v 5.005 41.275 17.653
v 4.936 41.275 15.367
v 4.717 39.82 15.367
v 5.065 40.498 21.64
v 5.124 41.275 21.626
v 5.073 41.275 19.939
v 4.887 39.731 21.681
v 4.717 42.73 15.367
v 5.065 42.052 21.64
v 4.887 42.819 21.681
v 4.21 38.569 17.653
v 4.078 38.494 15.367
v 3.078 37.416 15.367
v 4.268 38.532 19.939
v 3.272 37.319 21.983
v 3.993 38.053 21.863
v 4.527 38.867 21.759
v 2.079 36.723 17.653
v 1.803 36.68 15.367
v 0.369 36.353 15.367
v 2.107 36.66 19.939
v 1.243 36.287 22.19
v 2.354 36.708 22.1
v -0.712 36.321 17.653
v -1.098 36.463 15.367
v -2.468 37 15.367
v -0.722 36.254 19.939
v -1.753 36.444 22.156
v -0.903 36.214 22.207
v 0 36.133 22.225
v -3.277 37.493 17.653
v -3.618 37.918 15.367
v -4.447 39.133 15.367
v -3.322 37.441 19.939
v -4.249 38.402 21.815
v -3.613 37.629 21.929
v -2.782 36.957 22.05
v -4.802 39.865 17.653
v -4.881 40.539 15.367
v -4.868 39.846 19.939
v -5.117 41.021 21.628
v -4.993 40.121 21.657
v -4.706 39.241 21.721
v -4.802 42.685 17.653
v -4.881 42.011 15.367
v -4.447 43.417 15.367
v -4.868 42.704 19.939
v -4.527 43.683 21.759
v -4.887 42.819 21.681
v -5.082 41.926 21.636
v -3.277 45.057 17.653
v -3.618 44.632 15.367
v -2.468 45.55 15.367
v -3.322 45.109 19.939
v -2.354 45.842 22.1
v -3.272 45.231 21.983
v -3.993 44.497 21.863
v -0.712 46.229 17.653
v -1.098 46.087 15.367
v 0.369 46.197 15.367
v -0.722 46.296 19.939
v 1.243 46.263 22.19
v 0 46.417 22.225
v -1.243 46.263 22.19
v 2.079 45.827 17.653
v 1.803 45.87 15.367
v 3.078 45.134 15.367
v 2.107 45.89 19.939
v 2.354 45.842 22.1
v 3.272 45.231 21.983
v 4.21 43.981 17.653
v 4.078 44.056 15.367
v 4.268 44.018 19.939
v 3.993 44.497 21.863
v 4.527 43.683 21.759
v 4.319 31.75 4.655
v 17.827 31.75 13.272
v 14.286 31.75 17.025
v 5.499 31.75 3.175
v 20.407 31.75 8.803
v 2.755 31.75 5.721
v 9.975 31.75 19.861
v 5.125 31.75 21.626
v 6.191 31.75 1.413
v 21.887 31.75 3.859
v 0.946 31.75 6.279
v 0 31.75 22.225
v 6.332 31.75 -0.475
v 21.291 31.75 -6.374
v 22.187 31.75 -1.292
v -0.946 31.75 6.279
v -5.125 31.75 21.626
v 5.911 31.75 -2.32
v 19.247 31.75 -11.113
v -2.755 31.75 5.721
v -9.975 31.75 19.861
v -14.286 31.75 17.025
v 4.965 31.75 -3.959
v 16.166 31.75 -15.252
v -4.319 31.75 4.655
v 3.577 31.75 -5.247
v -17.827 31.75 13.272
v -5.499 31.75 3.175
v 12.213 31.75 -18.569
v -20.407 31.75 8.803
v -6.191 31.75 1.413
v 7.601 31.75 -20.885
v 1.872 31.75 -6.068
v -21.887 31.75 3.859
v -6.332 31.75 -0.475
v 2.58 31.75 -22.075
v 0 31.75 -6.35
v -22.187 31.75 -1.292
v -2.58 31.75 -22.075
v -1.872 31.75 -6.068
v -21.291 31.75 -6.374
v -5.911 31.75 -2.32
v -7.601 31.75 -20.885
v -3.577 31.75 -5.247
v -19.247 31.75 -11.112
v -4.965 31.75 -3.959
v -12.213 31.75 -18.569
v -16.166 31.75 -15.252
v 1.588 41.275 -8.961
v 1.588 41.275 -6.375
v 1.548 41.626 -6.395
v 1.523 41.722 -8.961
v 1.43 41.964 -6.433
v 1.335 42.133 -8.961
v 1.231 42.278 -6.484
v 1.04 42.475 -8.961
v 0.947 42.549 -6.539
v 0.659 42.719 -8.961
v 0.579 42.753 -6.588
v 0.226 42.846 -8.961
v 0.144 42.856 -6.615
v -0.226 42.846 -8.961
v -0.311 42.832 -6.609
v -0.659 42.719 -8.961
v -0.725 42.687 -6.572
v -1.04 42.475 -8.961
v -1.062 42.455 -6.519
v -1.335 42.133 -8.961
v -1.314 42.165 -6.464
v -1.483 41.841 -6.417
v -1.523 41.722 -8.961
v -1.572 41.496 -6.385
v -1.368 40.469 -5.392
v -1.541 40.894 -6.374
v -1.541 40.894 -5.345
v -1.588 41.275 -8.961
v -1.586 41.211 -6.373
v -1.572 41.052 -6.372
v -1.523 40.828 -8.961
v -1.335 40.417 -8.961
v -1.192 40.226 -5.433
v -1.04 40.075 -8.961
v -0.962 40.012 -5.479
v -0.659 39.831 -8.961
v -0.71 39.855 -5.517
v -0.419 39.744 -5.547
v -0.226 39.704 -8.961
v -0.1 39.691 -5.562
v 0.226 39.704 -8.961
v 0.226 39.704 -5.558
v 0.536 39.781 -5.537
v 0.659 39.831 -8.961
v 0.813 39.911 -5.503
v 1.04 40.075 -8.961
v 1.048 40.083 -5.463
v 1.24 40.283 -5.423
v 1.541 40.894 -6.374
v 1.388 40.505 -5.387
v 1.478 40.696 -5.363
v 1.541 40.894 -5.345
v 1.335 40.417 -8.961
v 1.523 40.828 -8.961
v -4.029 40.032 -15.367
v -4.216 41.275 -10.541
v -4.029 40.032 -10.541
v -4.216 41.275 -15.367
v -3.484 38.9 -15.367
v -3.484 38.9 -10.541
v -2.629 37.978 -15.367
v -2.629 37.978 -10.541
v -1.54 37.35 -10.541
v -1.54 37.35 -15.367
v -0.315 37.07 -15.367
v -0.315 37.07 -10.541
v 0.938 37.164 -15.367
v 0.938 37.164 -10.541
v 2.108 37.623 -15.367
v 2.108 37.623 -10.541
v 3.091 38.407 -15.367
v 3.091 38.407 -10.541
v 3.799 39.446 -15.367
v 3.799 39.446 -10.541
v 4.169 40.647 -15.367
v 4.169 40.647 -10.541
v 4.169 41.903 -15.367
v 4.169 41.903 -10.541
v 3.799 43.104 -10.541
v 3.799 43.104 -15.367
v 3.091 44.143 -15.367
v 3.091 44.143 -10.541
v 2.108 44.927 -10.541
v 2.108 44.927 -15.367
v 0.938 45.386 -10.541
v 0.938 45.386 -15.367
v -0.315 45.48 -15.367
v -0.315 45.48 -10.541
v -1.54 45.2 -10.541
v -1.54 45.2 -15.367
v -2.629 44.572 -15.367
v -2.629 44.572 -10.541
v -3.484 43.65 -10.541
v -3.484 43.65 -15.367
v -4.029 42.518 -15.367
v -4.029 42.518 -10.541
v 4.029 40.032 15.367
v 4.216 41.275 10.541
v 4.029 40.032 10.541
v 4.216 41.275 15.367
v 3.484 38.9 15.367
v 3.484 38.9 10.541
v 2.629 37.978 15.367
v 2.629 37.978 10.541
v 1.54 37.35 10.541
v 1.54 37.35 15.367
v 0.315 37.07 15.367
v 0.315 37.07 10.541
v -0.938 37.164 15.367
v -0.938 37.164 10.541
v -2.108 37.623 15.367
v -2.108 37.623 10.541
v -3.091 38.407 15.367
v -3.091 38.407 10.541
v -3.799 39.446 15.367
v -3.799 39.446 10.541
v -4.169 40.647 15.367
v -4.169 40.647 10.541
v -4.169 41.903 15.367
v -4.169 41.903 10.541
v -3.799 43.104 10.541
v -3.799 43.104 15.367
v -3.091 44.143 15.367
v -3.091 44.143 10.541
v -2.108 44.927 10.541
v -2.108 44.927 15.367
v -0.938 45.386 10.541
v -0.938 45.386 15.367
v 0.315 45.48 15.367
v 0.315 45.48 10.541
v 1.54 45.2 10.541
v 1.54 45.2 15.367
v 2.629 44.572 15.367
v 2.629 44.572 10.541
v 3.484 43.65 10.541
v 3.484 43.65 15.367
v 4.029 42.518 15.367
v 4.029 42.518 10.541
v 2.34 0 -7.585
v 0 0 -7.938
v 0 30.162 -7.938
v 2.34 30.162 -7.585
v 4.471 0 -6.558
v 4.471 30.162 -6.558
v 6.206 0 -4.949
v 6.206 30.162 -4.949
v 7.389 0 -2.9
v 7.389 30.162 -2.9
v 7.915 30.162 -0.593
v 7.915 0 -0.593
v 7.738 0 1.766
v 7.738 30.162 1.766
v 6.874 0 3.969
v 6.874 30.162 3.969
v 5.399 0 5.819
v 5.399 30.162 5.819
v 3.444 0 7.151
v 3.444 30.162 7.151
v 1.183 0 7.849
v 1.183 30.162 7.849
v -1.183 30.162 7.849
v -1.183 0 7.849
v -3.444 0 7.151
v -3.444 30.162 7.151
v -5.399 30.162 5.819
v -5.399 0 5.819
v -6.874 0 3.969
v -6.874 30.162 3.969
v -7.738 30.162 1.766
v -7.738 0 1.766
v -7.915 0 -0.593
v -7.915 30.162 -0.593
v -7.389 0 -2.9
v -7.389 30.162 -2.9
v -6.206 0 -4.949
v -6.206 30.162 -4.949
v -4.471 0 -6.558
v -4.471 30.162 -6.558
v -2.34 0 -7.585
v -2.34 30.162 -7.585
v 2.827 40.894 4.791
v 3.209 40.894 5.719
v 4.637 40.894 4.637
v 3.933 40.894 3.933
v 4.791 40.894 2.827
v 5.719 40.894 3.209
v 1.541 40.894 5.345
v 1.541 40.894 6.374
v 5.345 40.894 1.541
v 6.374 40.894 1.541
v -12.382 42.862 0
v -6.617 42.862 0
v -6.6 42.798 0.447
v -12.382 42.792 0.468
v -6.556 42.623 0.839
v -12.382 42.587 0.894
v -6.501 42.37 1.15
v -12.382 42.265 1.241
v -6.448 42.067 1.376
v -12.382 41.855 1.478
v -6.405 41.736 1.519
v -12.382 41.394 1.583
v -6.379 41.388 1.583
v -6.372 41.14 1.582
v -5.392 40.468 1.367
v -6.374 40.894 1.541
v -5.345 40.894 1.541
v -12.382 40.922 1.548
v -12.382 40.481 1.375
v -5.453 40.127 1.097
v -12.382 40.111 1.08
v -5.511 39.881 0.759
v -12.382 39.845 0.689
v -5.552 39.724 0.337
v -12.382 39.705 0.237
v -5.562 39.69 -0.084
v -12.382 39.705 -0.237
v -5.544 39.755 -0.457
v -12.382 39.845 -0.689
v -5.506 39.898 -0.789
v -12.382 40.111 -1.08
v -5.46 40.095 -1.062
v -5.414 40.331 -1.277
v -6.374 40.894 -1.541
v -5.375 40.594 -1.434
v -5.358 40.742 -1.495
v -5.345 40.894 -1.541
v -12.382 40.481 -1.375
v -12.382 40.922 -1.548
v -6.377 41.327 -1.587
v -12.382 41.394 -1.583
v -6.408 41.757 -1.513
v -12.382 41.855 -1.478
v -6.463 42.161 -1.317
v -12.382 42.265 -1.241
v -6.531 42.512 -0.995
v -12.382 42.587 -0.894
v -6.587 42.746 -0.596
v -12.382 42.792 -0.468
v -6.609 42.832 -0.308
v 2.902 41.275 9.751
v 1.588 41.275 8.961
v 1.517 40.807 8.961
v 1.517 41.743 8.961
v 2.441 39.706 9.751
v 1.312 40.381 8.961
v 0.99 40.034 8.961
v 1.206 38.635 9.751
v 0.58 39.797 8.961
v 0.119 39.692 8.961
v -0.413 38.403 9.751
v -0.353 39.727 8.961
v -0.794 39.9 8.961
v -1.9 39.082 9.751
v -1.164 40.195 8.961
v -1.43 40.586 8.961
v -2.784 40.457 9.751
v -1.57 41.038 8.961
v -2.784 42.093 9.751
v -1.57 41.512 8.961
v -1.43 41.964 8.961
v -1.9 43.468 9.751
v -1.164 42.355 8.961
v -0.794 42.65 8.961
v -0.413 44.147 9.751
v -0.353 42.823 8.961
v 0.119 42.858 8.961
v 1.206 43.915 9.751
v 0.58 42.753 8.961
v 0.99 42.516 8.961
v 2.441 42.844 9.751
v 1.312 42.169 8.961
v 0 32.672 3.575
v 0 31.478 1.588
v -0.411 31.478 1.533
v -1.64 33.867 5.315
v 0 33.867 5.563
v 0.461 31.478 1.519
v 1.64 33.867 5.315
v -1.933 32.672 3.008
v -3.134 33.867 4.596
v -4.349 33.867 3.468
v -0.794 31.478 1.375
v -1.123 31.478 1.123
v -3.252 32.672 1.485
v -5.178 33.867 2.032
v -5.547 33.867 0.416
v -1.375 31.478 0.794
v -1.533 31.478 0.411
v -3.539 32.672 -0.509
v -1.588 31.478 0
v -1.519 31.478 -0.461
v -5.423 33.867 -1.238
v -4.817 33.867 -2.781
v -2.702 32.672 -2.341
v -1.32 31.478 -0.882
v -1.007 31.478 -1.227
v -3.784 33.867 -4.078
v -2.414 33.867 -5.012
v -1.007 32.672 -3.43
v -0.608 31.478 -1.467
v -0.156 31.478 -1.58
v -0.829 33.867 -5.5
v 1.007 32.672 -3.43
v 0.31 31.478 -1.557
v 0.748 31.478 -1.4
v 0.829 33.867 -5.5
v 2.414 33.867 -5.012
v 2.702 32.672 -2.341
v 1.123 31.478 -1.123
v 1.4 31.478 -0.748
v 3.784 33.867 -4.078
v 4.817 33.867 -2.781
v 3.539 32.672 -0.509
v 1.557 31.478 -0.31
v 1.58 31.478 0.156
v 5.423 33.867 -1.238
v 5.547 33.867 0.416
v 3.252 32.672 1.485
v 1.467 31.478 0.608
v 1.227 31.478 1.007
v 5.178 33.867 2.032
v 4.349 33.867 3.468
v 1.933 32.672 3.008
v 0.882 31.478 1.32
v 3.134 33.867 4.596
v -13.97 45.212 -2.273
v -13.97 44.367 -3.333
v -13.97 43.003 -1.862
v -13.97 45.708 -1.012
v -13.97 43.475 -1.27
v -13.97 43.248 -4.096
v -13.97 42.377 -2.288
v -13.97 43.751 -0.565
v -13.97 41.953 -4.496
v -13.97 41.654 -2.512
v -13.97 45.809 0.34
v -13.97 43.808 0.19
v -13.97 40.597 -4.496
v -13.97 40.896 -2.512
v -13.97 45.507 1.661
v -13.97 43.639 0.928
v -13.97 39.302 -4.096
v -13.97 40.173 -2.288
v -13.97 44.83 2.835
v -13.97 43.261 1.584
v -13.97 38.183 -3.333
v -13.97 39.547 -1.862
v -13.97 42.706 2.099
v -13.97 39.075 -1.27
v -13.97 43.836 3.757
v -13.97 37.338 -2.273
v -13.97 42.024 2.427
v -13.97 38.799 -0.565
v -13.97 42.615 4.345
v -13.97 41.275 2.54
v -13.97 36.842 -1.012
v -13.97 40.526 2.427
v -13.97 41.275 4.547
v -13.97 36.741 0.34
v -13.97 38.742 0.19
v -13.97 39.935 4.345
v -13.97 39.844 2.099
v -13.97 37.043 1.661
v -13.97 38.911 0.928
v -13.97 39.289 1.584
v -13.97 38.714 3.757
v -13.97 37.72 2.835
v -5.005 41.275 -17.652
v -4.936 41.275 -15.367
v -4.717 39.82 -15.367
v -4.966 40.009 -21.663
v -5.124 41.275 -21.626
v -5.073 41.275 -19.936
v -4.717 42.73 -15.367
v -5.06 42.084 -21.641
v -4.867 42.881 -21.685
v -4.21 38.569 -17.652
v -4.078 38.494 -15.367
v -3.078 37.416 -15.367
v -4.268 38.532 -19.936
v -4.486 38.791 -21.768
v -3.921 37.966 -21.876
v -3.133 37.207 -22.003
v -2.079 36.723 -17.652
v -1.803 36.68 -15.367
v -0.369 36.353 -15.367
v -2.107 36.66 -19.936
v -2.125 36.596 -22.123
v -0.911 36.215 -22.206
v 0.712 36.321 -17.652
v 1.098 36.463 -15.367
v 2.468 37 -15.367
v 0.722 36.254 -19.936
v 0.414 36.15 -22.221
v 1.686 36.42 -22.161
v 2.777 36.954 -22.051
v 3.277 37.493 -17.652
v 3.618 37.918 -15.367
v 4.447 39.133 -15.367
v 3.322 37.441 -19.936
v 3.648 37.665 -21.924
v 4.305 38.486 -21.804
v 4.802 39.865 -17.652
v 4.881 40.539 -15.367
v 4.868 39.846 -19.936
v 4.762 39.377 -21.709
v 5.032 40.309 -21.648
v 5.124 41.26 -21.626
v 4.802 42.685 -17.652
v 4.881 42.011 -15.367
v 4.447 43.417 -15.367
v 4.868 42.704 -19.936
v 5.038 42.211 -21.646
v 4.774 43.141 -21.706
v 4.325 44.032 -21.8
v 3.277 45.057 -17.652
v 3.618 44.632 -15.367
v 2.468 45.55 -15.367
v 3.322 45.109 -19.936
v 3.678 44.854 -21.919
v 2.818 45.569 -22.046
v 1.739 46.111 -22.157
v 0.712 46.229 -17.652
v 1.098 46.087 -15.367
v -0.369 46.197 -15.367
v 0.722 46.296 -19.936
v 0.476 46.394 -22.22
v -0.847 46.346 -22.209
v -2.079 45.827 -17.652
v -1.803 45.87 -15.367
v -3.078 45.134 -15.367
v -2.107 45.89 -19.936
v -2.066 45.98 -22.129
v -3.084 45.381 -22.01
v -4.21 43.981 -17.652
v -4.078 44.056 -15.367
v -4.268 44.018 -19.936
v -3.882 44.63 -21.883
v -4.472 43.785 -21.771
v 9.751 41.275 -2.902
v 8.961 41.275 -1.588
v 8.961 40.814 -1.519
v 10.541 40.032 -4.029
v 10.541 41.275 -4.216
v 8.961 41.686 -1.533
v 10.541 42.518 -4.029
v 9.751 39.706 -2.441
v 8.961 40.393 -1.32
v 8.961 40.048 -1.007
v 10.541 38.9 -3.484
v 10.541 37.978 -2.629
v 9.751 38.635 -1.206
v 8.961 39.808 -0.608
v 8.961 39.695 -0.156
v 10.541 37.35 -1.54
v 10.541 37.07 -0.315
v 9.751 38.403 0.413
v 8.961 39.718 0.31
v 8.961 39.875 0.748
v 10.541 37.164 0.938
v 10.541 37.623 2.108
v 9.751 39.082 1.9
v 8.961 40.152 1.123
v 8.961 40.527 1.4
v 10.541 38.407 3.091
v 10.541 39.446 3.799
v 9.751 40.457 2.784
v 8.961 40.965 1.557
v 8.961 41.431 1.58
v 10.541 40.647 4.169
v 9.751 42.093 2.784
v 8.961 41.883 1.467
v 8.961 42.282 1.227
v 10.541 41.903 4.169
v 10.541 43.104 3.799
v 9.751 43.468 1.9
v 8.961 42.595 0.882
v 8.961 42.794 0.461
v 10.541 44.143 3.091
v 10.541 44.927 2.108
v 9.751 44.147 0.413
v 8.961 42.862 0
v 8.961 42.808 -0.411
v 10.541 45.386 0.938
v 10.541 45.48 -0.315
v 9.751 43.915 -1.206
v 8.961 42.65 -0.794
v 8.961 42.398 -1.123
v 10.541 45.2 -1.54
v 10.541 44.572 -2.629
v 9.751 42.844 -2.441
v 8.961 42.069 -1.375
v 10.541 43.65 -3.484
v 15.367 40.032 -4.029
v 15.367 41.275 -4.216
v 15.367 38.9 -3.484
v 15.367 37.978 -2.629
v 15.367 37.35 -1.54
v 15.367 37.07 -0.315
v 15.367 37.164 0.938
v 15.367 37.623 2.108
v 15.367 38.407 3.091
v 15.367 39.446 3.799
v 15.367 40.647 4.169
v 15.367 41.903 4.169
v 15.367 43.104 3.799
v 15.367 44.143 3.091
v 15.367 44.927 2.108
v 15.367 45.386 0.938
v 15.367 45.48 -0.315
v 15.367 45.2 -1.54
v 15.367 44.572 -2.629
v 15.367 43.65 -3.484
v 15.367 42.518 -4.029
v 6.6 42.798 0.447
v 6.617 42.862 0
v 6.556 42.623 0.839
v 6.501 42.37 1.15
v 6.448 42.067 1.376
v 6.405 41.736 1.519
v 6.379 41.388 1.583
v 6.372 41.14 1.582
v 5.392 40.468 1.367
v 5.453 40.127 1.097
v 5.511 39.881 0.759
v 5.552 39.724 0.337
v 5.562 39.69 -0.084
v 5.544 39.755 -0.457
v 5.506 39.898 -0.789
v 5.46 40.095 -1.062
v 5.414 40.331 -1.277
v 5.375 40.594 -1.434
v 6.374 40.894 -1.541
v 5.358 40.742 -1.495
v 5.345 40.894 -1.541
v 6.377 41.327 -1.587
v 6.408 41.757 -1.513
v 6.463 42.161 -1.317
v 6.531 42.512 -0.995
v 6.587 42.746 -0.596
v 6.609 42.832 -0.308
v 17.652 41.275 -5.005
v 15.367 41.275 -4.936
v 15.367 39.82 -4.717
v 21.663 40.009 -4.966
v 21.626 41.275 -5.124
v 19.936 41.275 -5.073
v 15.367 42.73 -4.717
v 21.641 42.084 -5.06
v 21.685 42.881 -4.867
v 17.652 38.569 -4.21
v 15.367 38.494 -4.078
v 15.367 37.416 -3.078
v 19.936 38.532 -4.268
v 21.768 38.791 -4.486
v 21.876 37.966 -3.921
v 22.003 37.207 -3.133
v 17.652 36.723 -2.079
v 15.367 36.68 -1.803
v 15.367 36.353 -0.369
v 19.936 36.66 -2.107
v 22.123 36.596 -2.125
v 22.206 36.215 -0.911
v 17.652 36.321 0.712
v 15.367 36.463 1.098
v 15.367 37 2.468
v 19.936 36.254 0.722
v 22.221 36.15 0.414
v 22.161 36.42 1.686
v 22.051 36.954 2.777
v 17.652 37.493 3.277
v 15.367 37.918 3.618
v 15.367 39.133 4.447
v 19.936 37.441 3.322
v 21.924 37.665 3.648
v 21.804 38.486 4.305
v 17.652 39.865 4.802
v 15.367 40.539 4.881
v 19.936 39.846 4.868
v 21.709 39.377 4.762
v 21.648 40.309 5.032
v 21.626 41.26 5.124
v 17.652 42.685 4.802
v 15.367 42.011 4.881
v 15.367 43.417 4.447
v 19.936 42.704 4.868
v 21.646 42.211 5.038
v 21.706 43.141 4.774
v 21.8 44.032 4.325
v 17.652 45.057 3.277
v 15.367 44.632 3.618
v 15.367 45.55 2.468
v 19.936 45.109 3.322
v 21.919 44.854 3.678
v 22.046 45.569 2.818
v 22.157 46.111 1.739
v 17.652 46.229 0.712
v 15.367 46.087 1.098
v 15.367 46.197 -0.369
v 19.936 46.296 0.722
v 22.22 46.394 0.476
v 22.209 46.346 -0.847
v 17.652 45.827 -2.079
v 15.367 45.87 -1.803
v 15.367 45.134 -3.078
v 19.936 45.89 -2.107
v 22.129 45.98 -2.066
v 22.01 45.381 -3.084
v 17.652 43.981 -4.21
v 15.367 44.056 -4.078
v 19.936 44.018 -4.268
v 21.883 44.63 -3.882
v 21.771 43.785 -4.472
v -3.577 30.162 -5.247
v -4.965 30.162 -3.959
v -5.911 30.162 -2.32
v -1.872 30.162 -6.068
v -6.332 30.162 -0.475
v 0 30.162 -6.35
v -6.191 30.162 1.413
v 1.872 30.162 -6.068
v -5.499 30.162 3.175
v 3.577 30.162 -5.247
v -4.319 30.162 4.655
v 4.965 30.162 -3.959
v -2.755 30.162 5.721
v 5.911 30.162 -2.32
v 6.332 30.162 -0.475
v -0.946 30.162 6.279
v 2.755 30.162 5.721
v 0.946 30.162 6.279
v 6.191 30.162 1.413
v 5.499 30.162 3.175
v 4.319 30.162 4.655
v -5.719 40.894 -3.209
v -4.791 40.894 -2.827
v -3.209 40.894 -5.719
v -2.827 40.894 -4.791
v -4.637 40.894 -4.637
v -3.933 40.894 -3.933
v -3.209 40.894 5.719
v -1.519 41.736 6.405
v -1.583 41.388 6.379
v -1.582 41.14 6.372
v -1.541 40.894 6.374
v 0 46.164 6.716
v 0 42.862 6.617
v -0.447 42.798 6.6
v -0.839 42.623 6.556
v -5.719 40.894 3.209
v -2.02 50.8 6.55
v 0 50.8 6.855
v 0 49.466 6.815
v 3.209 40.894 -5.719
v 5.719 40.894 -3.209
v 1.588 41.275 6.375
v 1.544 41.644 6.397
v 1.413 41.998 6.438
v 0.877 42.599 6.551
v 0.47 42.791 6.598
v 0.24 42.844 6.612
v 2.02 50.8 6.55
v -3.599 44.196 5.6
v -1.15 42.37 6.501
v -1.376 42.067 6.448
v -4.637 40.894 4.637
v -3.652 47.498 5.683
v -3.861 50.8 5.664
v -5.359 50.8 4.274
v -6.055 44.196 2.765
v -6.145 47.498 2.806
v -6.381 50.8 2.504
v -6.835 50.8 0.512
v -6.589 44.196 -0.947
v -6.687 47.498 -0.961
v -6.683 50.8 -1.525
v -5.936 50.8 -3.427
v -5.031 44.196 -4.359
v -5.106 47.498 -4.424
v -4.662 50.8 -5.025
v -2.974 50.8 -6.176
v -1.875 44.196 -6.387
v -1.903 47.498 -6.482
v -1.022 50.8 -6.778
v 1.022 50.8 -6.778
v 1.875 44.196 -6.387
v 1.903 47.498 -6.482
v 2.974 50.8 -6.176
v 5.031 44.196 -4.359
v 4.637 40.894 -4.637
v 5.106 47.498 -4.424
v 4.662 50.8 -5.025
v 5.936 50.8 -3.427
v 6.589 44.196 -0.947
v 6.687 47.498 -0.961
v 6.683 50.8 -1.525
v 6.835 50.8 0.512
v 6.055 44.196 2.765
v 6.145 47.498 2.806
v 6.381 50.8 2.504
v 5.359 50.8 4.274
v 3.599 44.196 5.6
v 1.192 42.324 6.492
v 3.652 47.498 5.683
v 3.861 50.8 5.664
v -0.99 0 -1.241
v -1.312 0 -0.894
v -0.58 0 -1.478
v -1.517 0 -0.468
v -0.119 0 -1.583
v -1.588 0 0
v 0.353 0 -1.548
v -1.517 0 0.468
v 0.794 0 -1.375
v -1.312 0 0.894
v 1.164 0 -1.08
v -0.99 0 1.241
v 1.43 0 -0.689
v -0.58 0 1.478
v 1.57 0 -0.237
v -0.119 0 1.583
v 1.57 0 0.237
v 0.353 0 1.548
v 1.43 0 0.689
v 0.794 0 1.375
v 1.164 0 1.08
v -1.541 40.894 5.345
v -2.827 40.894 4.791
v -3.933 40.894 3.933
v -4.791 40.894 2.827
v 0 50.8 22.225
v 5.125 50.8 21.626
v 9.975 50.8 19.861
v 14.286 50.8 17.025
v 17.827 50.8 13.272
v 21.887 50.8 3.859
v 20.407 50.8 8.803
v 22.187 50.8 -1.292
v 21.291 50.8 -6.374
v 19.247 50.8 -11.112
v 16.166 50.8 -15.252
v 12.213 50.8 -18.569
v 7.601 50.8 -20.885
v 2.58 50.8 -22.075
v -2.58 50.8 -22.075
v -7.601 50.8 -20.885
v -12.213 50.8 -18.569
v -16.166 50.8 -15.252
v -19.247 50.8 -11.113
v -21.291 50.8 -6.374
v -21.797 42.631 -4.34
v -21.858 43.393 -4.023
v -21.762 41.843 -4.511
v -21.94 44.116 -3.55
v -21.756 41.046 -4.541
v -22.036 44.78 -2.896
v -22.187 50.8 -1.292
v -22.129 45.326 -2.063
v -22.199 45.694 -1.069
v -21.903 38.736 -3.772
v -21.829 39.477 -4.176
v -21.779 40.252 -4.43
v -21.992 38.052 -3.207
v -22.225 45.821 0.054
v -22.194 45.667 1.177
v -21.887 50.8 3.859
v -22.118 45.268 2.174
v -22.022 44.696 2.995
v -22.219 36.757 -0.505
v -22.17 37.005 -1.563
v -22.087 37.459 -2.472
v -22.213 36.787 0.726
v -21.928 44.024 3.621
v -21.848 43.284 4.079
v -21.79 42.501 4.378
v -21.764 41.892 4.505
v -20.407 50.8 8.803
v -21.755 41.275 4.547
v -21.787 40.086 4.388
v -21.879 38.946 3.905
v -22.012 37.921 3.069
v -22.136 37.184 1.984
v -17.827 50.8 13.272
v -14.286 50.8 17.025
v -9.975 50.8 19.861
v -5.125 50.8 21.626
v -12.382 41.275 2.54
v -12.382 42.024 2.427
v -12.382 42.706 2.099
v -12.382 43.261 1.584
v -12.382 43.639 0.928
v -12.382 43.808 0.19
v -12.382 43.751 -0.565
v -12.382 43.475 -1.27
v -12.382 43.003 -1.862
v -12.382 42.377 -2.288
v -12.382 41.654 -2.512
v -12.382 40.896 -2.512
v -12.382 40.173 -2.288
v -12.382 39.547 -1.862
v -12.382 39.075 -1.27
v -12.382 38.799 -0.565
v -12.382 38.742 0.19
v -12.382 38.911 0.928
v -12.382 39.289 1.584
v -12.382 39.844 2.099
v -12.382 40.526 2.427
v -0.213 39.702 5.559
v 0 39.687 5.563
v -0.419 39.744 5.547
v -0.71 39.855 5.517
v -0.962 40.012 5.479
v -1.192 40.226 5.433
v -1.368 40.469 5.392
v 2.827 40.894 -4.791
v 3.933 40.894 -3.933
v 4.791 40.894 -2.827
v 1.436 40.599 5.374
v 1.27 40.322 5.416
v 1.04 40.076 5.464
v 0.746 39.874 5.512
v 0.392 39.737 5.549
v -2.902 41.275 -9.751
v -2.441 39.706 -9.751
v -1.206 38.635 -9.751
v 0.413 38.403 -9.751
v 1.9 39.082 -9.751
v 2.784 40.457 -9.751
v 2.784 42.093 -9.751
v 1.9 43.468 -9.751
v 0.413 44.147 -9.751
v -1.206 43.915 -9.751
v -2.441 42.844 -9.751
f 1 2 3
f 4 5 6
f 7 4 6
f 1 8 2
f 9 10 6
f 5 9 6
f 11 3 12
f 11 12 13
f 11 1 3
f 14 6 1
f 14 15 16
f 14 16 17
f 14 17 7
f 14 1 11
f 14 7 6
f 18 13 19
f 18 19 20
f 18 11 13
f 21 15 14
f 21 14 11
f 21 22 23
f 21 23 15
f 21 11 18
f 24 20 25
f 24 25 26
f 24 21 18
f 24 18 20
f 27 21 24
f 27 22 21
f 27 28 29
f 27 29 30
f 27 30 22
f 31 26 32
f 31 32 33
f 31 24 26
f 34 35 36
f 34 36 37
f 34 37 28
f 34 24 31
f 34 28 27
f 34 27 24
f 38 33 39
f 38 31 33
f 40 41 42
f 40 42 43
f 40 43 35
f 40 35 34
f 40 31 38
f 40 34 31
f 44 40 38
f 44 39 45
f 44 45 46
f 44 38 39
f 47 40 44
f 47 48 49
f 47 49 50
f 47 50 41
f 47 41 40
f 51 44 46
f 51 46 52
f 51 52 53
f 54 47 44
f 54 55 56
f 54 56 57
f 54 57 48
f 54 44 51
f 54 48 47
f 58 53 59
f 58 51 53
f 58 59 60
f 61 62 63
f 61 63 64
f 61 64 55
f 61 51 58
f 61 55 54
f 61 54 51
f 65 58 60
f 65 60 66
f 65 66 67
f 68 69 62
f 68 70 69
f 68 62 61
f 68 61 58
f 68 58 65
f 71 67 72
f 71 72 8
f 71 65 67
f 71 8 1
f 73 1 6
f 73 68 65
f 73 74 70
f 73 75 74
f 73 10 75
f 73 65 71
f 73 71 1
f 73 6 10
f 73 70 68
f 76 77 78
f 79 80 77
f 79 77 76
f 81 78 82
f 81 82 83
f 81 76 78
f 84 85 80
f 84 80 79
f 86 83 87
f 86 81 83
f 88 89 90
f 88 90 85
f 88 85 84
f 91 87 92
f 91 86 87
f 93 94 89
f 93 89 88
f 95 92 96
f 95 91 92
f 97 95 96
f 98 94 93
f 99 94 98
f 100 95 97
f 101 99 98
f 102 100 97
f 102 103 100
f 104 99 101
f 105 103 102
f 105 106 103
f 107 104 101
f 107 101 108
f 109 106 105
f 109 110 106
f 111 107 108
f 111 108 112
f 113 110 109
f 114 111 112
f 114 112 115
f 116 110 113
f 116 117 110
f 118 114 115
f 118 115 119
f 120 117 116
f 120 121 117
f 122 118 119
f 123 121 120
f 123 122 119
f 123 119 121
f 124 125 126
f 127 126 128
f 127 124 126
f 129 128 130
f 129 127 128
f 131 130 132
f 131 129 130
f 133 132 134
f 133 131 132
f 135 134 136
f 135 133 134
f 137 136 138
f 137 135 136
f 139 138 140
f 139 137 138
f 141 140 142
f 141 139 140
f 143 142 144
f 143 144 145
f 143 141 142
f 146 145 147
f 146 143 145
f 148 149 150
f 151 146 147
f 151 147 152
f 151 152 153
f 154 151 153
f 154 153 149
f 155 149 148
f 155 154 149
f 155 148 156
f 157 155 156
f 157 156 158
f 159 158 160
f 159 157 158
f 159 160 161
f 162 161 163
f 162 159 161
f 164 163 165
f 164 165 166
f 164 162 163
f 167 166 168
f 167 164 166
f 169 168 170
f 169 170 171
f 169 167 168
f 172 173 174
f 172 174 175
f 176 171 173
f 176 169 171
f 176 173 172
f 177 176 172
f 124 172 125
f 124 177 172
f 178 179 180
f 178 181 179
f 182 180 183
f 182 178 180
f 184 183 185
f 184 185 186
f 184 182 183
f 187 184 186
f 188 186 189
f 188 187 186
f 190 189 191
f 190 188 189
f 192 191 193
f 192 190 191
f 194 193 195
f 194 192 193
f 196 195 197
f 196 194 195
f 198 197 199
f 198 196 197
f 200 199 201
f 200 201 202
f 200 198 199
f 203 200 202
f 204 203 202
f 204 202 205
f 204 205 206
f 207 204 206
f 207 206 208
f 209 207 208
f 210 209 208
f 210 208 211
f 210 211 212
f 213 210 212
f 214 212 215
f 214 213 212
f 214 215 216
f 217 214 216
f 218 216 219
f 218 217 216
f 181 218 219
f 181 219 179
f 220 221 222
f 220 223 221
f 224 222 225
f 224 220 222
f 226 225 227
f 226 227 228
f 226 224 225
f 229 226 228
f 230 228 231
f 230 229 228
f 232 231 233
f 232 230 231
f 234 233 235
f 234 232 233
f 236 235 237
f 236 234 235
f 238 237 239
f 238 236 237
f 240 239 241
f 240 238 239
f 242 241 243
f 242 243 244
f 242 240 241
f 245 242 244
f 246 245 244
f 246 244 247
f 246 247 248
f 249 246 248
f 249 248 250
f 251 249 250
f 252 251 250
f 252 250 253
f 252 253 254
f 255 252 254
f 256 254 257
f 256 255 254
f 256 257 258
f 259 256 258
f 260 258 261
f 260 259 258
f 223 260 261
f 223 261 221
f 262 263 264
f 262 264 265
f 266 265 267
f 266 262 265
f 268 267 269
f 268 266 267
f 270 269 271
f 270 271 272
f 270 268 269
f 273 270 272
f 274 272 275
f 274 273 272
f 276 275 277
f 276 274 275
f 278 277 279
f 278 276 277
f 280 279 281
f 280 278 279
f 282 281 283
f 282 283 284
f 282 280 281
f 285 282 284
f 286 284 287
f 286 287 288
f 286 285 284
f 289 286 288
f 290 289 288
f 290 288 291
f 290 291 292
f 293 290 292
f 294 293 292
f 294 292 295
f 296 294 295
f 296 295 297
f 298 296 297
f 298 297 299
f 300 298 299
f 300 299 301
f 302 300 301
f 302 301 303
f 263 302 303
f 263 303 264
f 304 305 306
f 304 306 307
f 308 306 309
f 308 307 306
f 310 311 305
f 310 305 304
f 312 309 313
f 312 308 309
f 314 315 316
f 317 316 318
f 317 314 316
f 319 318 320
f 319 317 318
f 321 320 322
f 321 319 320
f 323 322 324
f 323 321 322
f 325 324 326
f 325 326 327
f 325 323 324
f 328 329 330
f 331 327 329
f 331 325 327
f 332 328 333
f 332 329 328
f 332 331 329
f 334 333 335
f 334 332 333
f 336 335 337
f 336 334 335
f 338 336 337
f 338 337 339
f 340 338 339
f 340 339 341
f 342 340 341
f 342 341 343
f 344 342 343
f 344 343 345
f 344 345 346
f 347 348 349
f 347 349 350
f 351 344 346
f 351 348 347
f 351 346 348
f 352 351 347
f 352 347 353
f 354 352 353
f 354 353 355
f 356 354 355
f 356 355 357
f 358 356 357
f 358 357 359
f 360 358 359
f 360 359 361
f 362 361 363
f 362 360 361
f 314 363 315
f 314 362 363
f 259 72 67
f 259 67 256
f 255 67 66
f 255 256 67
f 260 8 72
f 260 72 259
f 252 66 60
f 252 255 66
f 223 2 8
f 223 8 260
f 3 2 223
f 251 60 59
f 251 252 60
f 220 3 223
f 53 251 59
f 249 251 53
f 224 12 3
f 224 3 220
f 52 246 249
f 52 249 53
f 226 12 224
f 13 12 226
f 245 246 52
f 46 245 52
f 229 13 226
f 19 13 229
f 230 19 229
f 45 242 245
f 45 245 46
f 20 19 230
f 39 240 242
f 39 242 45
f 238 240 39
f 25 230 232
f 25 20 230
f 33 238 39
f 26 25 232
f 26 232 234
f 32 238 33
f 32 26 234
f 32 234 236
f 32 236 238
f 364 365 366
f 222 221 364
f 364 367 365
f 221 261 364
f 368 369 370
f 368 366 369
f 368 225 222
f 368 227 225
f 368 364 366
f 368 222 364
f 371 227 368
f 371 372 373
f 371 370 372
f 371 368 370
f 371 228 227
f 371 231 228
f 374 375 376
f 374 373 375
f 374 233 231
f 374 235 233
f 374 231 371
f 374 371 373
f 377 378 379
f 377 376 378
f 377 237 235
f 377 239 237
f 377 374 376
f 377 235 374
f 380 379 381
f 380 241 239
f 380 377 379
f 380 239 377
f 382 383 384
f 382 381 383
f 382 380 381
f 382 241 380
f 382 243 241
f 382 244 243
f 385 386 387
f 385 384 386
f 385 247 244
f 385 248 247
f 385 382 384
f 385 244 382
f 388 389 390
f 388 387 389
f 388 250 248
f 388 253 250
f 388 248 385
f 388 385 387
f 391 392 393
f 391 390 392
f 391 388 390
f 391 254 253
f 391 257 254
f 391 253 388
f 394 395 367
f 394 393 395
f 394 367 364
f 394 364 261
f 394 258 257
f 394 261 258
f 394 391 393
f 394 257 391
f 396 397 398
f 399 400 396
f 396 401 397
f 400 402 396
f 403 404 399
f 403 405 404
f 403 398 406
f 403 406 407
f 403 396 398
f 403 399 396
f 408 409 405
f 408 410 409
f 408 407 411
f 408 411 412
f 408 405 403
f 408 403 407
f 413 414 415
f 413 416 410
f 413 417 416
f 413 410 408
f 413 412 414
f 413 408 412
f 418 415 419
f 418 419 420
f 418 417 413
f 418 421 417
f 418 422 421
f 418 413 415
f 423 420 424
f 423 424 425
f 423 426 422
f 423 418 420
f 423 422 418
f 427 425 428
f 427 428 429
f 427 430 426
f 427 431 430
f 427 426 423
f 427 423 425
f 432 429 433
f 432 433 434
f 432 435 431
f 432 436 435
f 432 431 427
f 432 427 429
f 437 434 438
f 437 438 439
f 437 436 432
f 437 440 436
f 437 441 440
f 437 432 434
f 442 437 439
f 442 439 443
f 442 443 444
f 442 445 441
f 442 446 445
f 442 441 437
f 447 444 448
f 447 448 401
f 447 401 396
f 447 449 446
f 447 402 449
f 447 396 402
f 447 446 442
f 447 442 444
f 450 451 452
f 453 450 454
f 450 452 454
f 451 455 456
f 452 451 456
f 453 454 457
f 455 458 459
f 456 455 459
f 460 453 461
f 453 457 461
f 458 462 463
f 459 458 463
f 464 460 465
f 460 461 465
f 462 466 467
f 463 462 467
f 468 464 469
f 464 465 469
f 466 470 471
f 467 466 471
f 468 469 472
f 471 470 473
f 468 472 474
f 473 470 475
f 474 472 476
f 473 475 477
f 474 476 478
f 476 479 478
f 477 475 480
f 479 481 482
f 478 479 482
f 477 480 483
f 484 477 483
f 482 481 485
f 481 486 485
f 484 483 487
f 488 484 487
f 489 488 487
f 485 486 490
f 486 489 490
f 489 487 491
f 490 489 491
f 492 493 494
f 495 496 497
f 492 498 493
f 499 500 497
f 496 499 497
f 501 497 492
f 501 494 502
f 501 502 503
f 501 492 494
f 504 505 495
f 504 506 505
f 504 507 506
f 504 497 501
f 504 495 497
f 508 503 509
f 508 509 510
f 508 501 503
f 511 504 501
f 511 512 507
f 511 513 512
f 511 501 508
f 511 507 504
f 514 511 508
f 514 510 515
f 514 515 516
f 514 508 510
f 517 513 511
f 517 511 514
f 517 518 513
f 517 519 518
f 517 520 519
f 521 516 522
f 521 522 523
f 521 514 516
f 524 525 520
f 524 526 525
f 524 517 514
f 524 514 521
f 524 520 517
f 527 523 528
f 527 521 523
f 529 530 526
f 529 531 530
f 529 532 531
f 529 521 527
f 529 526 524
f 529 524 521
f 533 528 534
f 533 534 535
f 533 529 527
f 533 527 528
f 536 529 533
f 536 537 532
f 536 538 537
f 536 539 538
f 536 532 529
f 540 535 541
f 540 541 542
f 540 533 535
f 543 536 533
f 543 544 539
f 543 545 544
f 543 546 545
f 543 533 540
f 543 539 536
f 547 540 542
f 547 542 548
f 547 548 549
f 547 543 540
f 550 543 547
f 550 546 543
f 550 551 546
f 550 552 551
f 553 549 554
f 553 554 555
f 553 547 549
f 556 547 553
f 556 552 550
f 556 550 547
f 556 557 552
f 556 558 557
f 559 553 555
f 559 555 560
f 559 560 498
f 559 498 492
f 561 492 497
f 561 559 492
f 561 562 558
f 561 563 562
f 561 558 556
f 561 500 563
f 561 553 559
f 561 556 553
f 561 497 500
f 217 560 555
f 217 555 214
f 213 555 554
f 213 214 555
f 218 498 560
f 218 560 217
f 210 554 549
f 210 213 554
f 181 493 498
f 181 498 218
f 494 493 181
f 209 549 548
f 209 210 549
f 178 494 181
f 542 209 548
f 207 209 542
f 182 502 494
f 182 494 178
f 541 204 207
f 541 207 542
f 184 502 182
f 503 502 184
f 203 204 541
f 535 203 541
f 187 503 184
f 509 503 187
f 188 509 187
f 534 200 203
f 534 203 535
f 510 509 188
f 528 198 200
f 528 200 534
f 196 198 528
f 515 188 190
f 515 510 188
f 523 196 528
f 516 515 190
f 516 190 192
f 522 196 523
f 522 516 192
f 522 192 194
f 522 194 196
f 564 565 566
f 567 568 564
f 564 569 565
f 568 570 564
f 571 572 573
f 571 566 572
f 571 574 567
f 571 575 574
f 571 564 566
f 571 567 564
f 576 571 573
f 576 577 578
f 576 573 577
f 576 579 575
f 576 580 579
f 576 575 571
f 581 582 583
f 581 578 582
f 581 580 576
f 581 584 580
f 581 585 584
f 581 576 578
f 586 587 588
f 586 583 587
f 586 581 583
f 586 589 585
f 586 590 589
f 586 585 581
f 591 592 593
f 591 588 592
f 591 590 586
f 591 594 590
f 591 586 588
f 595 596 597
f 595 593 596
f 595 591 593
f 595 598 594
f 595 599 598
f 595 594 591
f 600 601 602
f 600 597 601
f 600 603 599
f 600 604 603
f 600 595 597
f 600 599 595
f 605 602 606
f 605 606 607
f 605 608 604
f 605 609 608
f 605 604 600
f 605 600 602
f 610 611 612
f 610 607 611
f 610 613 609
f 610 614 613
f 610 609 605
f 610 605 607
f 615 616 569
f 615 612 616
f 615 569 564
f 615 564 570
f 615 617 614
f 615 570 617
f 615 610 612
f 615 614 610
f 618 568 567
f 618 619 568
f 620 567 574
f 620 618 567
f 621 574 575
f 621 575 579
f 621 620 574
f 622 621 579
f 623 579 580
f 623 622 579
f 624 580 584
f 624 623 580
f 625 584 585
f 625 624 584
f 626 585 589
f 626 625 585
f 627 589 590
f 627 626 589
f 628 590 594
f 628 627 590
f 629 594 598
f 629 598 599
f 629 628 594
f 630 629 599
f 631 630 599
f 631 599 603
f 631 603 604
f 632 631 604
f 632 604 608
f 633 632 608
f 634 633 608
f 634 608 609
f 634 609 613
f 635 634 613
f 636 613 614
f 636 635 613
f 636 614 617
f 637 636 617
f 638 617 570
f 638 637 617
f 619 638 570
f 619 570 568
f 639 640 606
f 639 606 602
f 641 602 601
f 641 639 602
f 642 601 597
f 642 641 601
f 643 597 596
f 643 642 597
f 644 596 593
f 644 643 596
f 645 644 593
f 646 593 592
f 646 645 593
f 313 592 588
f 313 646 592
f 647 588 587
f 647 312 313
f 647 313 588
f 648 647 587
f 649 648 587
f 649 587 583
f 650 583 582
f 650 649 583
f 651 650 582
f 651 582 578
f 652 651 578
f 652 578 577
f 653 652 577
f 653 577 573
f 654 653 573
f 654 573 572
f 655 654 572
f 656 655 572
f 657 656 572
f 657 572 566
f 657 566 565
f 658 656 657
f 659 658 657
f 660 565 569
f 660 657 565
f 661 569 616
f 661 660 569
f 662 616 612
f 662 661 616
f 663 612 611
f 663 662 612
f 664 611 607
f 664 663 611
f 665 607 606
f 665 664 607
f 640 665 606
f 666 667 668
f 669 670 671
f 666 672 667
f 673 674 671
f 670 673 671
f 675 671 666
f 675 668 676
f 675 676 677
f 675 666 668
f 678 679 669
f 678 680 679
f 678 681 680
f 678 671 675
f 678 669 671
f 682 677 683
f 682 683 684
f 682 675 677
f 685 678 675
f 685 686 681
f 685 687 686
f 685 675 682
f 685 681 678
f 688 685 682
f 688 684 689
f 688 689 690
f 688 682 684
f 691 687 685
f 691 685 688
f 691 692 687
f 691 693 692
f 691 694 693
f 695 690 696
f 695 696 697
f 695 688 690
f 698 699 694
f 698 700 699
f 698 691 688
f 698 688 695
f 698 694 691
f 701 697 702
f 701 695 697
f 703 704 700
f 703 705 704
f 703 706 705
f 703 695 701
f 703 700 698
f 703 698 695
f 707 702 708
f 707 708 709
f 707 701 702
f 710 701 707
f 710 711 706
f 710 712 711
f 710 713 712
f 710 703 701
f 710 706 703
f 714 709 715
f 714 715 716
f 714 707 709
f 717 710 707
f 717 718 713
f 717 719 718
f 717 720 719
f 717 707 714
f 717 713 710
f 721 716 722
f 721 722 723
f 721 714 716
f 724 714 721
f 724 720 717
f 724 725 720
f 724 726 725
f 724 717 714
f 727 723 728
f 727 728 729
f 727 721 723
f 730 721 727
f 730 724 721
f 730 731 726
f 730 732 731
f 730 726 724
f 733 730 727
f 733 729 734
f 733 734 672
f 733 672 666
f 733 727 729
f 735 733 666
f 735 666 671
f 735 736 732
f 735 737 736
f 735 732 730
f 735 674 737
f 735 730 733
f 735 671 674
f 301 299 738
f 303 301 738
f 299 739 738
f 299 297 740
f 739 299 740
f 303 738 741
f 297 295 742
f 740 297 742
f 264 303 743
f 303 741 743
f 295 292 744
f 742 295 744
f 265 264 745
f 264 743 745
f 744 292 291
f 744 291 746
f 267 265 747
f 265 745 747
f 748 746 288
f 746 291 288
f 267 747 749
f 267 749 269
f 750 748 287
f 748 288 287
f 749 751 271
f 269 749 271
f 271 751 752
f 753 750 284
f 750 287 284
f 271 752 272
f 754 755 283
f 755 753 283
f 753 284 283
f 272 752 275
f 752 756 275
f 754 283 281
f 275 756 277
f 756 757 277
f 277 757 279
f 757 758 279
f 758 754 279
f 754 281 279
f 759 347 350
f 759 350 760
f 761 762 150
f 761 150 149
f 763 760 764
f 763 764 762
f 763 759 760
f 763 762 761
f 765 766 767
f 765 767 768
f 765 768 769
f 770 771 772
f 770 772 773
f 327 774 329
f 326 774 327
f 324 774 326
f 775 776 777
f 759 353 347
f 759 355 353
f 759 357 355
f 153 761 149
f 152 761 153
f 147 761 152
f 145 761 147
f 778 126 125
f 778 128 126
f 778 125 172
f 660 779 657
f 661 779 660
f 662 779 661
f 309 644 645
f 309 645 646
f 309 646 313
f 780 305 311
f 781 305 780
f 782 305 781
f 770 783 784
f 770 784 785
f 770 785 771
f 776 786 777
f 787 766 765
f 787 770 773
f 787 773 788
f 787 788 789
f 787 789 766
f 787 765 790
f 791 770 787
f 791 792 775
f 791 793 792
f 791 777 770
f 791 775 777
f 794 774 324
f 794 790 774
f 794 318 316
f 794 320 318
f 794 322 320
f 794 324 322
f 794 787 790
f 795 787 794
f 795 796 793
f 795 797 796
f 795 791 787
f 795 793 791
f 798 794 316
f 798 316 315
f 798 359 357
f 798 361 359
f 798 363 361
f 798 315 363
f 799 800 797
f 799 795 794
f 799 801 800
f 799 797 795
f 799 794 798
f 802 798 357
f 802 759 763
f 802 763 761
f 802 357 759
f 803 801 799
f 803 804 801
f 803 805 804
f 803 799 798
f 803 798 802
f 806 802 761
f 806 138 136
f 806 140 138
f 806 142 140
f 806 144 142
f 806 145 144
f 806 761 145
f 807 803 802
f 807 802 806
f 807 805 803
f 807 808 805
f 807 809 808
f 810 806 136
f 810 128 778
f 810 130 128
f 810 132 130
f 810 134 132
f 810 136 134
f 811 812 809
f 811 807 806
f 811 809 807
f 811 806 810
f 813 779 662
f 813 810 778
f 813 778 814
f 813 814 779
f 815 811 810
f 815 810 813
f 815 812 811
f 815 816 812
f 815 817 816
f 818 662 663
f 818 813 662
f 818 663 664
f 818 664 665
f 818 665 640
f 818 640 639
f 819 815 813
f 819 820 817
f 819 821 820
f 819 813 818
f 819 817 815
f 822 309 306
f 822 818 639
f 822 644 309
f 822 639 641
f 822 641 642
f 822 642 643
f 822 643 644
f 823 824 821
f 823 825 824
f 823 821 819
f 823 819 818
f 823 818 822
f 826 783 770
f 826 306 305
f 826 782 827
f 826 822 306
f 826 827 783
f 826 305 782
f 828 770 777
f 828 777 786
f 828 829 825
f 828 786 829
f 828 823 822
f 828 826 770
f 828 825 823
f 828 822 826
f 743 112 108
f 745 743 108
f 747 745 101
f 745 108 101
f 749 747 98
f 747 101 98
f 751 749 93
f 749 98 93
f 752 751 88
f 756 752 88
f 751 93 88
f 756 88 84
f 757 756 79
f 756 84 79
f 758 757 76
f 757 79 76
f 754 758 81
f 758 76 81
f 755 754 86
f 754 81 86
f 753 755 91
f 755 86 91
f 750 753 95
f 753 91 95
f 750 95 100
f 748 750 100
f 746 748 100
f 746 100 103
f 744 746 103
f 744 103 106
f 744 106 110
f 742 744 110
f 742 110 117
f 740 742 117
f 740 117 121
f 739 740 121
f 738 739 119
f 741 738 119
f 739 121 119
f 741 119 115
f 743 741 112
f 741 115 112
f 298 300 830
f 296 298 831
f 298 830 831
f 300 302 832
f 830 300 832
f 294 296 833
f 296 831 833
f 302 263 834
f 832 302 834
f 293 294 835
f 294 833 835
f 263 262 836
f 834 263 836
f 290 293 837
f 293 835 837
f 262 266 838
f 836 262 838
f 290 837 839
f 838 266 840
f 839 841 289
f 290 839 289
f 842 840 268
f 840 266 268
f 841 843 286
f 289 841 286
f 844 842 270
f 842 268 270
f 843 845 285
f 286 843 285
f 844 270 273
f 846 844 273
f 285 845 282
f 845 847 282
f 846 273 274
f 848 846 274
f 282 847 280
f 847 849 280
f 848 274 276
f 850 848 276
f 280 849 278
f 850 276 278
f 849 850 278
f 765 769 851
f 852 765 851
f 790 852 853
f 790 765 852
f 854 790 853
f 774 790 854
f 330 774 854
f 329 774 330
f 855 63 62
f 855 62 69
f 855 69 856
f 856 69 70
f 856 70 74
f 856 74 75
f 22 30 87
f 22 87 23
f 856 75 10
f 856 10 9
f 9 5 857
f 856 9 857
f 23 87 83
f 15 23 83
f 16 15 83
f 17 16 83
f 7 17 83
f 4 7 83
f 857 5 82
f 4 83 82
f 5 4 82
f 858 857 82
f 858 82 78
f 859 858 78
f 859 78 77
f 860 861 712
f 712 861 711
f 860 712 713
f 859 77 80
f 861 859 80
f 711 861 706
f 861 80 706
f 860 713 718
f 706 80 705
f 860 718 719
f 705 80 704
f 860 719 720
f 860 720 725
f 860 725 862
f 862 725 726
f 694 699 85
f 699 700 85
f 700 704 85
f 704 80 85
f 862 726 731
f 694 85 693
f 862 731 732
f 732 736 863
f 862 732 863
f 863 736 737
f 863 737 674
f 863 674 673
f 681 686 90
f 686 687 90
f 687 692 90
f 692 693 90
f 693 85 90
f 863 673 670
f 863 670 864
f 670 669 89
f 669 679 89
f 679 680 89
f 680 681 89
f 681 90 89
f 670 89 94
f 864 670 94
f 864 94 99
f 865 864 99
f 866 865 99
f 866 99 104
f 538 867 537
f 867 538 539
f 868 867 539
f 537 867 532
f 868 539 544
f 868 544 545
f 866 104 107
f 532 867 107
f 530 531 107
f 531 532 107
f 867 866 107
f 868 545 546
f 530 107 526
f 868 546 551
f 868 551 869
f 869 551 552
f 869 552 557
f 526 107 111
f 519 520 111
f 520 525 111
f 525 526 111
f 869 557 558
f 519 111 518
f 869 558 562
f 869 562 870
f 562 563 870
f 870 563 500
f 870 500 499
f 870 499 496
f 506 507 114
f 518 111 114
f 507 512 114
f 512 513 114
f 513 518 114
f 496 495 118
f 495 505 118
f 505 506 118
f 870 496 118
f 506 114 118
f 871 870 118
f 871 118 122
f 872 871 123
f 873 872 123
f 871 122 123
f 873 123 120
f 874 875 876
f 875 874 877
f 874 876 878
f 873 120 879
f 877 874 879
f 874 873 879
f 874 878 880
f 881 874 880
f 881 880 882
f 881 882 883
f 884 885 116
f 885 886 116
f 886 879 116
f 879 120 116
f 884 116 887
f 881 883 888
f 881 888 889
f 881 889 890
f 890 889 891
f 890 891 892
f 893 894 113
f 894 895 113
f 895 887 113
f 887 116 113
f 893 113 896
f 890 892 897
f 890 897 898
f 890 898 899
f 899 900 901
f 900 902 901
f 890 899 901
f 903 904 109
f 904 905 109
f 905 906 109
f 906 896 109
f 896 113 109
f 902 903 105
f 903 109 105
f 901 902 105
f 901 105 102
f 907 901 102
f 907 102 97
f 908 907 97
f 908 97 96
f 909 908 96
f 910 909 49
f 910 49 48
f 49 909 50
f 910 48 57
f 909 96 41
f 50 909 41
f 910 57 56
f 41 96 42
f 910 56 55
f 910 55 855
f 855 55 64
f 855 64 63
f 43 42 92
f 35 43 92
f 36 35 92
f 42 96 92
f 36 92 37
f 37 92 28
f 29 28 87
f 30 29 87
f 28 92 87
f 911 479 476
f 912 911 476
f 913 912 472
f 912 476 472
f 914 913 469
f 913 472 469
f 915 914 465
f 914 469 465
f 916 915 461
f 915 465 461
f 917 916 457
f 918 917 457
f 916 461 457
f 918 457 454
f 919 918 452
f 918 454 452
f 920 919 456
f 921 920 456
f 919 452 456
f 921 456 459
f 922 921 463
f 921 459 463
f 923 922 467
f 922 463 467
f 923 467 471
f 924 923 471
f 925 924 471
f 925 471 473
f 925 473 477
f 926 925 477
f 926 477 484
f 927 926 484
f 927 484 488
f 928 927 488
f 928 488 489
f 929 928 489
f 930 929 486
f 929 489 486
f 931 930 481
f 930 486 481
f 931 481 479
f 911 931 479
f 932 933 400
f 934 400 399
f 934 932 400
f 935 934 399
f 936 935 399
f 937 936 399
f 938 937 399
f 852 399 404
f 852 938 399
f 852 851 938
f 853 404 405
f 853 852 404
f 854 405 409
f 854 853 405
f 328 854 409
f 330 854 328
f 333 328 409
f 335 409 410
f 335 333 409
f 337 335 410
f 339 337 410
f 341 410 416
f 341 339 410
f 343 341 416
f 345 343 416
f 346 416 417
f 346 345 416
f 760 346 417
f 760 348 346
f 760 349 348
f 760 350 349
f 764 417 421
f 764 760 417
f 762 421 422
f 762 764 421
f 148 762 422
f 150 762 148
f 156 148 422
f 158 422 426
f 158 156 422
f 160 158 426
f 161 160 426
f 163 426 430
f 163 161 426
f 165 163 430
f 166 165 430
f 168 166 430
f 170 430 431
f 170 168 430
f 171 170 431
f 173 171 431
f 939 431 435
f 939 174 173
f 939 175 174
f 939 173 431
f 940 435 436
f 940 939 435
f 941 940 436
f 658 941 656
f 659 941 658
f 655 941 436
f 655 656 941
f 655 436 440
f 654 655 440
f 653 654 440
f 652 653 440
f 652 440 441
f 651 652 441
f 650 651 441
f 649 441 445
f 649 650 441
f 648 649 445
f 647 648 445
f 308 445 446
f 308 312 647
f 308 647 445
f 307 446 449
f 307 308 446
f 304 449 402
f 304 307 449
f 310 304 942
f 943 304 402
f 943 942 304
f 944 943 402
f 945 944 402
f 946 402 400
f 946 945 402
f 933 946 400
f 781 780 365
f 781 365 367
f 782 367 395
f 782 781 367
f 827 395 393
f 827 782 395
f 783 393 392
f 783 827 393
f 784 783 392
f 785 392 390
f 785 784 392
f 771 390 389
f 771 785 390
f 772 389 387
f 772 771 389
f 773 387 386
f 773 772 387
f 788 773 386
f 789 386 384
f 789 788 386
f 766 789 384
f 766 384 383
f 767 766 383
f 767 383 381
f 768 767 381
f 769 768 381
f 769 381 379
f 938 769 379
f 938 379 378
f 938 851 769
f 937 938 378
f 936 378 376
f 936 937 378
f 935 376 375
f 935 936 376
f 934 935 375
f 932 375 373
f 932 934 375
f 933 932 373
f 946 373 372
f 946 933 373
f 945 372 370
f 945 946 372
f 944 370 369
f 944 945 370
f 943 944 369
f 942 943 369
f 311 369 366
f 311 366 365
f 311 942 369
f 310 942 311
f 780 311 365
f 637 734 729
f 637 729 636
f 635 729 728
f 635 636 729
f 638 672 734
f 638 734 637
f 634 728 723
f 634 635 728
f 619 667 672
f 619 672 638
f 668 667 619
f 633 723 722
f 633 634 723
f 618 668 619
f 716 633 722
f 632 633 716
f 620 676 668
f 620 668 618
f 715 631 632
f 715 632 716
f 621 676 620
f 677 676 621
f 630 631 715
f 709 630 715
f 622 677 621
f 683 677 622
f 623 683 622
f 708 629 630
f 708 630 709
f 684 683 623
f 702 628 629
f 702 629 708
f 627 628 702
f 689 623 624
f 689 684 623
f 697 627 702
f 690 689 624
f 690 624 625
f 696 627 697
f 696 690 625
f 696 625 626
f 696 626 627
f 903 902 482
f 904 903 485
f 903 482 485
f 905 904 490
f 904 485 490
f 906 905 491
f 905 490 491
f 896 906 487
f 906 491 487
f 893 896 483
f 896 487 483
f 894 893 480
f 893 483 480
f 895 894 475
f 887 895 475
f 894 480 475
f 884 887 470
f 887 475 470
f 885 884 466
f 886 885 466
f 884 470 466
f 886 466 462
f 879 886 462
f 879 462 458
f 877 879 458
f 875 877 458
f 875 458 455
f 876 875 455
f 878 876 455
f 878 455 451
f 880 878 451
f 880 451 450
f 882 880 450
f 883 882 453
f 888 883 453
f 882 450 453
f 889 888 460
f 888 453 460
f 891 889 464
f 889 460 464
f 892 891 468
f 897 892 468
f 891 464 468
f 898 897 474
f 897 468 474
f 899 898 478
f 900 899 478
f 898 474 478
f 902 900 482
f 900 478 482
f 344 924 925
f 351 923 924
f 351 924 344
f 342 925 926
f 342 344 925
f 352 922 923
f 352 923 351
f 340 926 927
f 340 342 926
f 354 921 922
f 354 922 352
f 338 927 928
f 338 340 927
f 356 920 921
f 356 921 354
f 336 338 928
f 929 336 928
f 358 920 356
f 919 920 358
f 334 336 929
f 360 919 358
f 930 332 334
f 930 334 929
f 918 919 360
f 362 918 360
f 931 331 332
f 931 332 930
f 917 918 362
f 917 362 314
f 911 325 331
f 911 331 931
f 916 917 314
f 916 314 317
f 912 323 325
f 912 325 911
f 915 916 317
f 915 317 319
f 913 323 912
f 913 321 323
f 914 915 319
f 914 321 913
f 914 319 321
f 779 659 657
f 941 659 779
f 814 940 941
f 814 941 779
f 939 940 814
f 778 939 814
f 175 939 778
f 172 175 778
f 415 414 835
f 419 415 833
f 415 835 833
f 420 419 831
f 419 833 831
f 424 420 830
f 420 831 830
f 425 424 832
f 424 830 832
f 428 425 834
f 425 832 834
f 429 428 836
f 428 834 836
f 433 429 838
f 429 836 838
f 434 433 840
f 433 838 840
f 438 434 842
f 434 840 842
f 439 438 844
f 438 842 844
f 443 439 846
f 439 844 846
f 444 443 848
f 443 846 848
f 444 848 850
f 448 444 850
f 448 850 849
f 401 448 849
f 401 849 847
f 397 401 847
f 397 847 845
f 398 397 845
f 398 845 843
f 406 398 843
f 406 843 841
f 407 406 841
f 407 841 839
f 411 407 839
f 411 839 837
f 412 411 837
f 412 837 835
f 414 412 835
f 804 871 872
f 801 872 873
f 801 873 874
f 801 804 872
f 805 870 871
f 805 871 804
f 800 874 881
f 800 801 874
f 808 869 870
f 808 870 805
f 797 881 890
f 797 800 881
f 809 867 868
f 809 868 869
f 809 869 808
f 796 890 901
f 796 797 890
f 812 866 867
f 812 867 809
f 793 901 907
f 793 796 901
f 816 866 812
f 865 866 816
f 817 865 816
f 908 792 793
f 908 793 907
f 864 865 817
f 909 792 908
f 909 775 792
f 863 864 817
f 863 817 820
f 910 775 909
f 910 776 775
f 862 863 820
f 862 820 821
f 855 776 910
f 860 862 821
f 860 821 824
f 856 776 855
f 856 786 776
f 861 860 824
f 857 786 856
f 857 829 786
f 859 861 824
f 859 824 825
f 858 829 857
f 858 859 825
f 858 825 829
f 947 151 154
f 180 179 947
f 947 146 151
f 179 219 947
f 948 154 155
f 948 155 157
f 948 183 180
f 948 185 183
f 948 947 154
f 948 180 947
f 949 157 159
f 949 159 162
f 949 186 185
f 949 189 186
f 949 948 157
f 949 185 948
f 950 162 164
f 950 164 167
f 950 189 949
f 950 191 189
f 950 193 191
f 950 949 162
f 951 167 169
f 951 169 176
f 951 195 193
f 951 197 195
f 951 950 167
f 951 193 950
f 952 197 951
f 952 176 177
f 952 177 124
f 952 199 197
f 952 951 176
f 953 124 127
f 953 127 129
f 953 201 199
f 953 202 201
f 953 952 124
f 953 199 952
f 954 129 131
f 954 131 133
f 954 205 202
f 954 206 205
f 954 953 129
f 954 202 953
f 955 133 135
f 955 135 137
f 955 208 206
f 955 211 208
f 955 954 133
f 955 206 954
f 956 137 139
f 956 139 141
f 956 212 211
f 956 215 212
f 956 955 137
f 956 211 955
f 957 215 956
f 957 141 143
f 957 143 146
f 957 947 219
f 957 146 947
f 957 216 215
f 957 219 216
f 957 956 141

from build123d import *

# Parameters (mm, degrees)
SKETCH1_R                              = 22.225
BOSS_EXTRUDE1_DEPTH                    = 50.8
SKETCH2_OUTSIDE_W                      = 62.614
SKETCH2_OUTSIDE_H                      = 62.614
SKETCH2_OUTSIDE_R                      = 7.9375
CUT_EXTRUDE1_DEPTH                     = 31.75
F_1_8_0_125_DIAMETER_HOLE1_D           = 3.175
F_1_8_START                            = -22.225000076
F_1_8_0_125_DIAMETER_HOLE2_OUTLINE_R   = 1.5875
F_1_8_0_125_DIAMETER_HOLE2_DEPTH       = 31.186397695
F_1_8_START_2                          = -8.961397619
F_1_8_0_125_DIAMETER_HOLE2_2_OUTLINE_R = 1.5875
F_1_8_0_125_DIAMETER_HOLE2_2_DEPTH     = 17.922795238
F_1_8_27_NPSM_TAPPED_HOLE1_D           = 9.0932
F_1_8_27_NPSM_TAPPED_HOLE1_DEPTH       = 6.35
F_1_8_27_NPSM_TAPPED_HOLE1_TIP         = 2.73187289
CUT_EXTRUDE2_START                     = -13.97
SKETCH11_R                             = 4.5466
CUT_EXTRUDE2_DEPTH                     = 6.35
SKETCH12_R                             = 2.54
CUT_EXTRUDE3_DEPTH                     = 1.5875
CUT_EXTRUDE5_START                     = -31.75
SKETCH13_OUTSIDE_W                     = 62.614
SKETCH13_OUTSIDE_H                     = 62.614
SKETCH13_OUTSIDE_R                     = 6.35
CUT_EXTRUDE5_DEPTH                     = 1.5875


# Read off the part's stored shape, not the designer's step: 1/8 (0.125) Diameter Hole2
with BuildPart() as part:
    # Sketch1 → Boss-Extrude1 (new body)
    with BuildSketch(Plane(origin=(0, 0, 0), x_dir=(1, 0, 0), z_dir=(0, 1, 0))):
        with Locations(Location((0, 0, 0), (0, 0, 270))):
            Circle(SKETCH1_R)
    extrude(amount=BOSS_EXTRUDE1_DEPTH)

    # Sketch2 outside → Cut-Extrude1 (cut)
    with BuildSketch(Plane(origin=(0, 0, 0), x_dir=(-1, 0, 0), z_dir=(0, -1, 0))):
        Rectangle(SKETCH2_OUTSIDE_W, SKETCH2_OUTSIDE_H)
        with Locations(Location((0, 0, 0), (0, 0, 90))):
            Circle(SKETCH2_OUTSIDE_R, mode=Mode.SUBTRACT)
    extrude(amount=-CUT_EXTRUDE1_DEPTH, mode=Mode.SUBTRACT)

    # 1/8 (0.125) Diameter Hole1 (through all)
    with Locations(Plane(origin=(0, 50.8, 0), x_dir=(1, 0, 0), z_dir=(0, 1, 0))):
        with Locations((0, 0)):
            Hole(F_1_8_0_125_DIAMETER_HOLE1_D / 2)

    # Sketch6 → 1/4 NPT Tapped Hole1 (revolve, cut)
    with BuildSketch(Plane(origin=(0, 50.8, 0), x_dir=(0, 0, 1), z_dir=(1, 0, 0))):
        Polygon((0, 0), (0, 20.275689079), (5.5626, 16.9333418), (5.5626, 9.906), (6.557984794, 9.906), (6.8545837, 0), align=None)
    revolve(axis=Axis((0, 57.15, 0), (0, -1, 0)), mode=Mode.SUBTRACT)

    # Sketch8 → 1/8 NPT Tapped Hole1 (revolve, cut)
    with BuildSketch(Plane(origin=(22.225, 41.275, 0), x_dir=(0, 0, -1), z_dir=(0, 1, 0))):
        Polygon((0, 0), (0, 14.217468714), (4.2164, 11.684), (4.2164, 6.858), (4.936181096, 6.858), (5.1415188, 0), align=None)
    revolve(axis=Axis((28.575, 41.275, 0), (-1, 0, 0)), mode=Mode.SUBTRACT)

    # Sketch8 at point 2 (carried to point 2, square into its face) → 1/8 NPT Tapped Hole1 at 2 (revolve, cut)
    with BuildSketch(Plane(origin=(0, 41.275, -22.225), x_dir=(-1, 0, 0), z_dir=(0, 1, 0))):
        Polygon((0, 0), (0, 14.217468714), (4.2164, 11.684), (4.2164, 6.858), (4.936181096, 6.858), (5.1415188, 0), align=None)
    revolve(axis=Axis((0, 41.275, -28.575), (0, 0, 1)), mode=Mode.SUBTRACT)

    # Sketch8 at point 3 (carried to point 3, square into its face) → 1/8 NPT Tapped Hole1 at 3 (revolve, cut)
    with BuildSketch(Plane(origin=(0, 41.275, 22.225), x_dir=(1, 0, 0), z_dir=(0, 1, 0))):
        Polygon((0, 0), (0, 14.217468714), (4.2164, 11.684), (4.2164, 6.858), (4.936181096, 6.858), (5.1415188, 0), align=None)
    revolve(axis=Axis((0, 41.275, 28.575), (0, 0, -1)), mode=Mode.SUBTRACT)

    # 1/8 (0.125) Diameter Hole2 outline → 1/8 (0.125) Diameter Hole2 (cut)
    with BuildSketch(Plane.YZ.offset(F_1_8_START)):
        with Locations((41.275, 0)):
            Circle(F_1_8_0_125_DIAMETER_HOLE2_OUTLINE_R)
    extrude(amount=F_1_8_0_125_DIAMETER_HOLE2_DEPTH, mode=Mode.SUBTRACT)

    # 1_8 _0.125_ Diameter Hole2 2 outline → 1_8 _0.125_ Diameter Hole2 2 (cut)
    with BuildSketch(Plane.XY.offset(F_1_8_START_2)):
        with Locations((0, 41.275)):
            Circle(F_1_8_0_125_DIAMETER_HOLE2_2_OUTLINE_R)
    extrude(amount=F_1_8_0_125_DIAMETER_HOLE2_2_DEPTH, mode=Mode.SUBTRACT)

    # 1/8-27 NPSM Tapped Hole1
    with Locations(Plane(origin=(-22.225, 41.275, 0), x_dir=(0, 0, -1), z_dir=(-1, 0, 0))):
        with Locations((0, 0)):
            Hole(F_1_8_27_NPSM_TAPPED_HOLE1_D / 2, depth=F_1_8_27_NPSM_TAPPED_HOLE1_DEPTH)
            with Locations((0, 0, -(F_1_8_27_NPSM_TAPPED_HOLE1_DEPTH + F_1_8_27_NPSM_TAPPED_HOLE1_TIP / 2))):  # 118° drill point
                Cone(0, F_1_8_27_NPSM_TAPPED_HOLE1_D / 2, F_1_8_27_NPSM_TAPPED_HOLE1_TIP, mode=Mode.SUBTRACT)

    # Sketch11 → Cut-Extrude2 (cut)
    with BuildSketch(Plane(origin=(0, 0, 0), x_dir=(0, 0, -1), z_dir=(1, 0, 0)).offset(CUT_EXTRUDE2_START)):
        with Locations(Location((0, 41.275, 0), (0, 0, 180))):
            Circle(SKETCH11_R)
    extrude(amount=-CUT_EXTRUDE2_DEPTH, mode=Mode.SUBTRACT)

    # Sketch12 → Cut-Extrude3 (cut)
    with BuildSketch(Plane.ZY.offset(13.97)):
        with Locations((0, 41.275)):
            Circle(SKETCH12_R)
    extrude(amount=-CUT_EXTRUDE3_DEPTH, mode=Mode.SUBTRACT)

    # Sketch13 outside → Cut-Extrude5 (cut)
    with BuildSketch(Plane.XZ.offset(CUT_EXTRUDE5_START)):
        Rectangle(SKETCH13_OUTSIDE_W, SKETCH13_OUTSIDE_H)
        with Locations(Location((0, 0, 0), (0, 0, 270))):
            Circle(SKETCH13_OUTSIDE_R, mode=Mode.SUBTRACT)
    extrude(amount=CUT_EXTRUDE5_DEPTH, mode=Mode.SUBTRACT)


solid = part.part
